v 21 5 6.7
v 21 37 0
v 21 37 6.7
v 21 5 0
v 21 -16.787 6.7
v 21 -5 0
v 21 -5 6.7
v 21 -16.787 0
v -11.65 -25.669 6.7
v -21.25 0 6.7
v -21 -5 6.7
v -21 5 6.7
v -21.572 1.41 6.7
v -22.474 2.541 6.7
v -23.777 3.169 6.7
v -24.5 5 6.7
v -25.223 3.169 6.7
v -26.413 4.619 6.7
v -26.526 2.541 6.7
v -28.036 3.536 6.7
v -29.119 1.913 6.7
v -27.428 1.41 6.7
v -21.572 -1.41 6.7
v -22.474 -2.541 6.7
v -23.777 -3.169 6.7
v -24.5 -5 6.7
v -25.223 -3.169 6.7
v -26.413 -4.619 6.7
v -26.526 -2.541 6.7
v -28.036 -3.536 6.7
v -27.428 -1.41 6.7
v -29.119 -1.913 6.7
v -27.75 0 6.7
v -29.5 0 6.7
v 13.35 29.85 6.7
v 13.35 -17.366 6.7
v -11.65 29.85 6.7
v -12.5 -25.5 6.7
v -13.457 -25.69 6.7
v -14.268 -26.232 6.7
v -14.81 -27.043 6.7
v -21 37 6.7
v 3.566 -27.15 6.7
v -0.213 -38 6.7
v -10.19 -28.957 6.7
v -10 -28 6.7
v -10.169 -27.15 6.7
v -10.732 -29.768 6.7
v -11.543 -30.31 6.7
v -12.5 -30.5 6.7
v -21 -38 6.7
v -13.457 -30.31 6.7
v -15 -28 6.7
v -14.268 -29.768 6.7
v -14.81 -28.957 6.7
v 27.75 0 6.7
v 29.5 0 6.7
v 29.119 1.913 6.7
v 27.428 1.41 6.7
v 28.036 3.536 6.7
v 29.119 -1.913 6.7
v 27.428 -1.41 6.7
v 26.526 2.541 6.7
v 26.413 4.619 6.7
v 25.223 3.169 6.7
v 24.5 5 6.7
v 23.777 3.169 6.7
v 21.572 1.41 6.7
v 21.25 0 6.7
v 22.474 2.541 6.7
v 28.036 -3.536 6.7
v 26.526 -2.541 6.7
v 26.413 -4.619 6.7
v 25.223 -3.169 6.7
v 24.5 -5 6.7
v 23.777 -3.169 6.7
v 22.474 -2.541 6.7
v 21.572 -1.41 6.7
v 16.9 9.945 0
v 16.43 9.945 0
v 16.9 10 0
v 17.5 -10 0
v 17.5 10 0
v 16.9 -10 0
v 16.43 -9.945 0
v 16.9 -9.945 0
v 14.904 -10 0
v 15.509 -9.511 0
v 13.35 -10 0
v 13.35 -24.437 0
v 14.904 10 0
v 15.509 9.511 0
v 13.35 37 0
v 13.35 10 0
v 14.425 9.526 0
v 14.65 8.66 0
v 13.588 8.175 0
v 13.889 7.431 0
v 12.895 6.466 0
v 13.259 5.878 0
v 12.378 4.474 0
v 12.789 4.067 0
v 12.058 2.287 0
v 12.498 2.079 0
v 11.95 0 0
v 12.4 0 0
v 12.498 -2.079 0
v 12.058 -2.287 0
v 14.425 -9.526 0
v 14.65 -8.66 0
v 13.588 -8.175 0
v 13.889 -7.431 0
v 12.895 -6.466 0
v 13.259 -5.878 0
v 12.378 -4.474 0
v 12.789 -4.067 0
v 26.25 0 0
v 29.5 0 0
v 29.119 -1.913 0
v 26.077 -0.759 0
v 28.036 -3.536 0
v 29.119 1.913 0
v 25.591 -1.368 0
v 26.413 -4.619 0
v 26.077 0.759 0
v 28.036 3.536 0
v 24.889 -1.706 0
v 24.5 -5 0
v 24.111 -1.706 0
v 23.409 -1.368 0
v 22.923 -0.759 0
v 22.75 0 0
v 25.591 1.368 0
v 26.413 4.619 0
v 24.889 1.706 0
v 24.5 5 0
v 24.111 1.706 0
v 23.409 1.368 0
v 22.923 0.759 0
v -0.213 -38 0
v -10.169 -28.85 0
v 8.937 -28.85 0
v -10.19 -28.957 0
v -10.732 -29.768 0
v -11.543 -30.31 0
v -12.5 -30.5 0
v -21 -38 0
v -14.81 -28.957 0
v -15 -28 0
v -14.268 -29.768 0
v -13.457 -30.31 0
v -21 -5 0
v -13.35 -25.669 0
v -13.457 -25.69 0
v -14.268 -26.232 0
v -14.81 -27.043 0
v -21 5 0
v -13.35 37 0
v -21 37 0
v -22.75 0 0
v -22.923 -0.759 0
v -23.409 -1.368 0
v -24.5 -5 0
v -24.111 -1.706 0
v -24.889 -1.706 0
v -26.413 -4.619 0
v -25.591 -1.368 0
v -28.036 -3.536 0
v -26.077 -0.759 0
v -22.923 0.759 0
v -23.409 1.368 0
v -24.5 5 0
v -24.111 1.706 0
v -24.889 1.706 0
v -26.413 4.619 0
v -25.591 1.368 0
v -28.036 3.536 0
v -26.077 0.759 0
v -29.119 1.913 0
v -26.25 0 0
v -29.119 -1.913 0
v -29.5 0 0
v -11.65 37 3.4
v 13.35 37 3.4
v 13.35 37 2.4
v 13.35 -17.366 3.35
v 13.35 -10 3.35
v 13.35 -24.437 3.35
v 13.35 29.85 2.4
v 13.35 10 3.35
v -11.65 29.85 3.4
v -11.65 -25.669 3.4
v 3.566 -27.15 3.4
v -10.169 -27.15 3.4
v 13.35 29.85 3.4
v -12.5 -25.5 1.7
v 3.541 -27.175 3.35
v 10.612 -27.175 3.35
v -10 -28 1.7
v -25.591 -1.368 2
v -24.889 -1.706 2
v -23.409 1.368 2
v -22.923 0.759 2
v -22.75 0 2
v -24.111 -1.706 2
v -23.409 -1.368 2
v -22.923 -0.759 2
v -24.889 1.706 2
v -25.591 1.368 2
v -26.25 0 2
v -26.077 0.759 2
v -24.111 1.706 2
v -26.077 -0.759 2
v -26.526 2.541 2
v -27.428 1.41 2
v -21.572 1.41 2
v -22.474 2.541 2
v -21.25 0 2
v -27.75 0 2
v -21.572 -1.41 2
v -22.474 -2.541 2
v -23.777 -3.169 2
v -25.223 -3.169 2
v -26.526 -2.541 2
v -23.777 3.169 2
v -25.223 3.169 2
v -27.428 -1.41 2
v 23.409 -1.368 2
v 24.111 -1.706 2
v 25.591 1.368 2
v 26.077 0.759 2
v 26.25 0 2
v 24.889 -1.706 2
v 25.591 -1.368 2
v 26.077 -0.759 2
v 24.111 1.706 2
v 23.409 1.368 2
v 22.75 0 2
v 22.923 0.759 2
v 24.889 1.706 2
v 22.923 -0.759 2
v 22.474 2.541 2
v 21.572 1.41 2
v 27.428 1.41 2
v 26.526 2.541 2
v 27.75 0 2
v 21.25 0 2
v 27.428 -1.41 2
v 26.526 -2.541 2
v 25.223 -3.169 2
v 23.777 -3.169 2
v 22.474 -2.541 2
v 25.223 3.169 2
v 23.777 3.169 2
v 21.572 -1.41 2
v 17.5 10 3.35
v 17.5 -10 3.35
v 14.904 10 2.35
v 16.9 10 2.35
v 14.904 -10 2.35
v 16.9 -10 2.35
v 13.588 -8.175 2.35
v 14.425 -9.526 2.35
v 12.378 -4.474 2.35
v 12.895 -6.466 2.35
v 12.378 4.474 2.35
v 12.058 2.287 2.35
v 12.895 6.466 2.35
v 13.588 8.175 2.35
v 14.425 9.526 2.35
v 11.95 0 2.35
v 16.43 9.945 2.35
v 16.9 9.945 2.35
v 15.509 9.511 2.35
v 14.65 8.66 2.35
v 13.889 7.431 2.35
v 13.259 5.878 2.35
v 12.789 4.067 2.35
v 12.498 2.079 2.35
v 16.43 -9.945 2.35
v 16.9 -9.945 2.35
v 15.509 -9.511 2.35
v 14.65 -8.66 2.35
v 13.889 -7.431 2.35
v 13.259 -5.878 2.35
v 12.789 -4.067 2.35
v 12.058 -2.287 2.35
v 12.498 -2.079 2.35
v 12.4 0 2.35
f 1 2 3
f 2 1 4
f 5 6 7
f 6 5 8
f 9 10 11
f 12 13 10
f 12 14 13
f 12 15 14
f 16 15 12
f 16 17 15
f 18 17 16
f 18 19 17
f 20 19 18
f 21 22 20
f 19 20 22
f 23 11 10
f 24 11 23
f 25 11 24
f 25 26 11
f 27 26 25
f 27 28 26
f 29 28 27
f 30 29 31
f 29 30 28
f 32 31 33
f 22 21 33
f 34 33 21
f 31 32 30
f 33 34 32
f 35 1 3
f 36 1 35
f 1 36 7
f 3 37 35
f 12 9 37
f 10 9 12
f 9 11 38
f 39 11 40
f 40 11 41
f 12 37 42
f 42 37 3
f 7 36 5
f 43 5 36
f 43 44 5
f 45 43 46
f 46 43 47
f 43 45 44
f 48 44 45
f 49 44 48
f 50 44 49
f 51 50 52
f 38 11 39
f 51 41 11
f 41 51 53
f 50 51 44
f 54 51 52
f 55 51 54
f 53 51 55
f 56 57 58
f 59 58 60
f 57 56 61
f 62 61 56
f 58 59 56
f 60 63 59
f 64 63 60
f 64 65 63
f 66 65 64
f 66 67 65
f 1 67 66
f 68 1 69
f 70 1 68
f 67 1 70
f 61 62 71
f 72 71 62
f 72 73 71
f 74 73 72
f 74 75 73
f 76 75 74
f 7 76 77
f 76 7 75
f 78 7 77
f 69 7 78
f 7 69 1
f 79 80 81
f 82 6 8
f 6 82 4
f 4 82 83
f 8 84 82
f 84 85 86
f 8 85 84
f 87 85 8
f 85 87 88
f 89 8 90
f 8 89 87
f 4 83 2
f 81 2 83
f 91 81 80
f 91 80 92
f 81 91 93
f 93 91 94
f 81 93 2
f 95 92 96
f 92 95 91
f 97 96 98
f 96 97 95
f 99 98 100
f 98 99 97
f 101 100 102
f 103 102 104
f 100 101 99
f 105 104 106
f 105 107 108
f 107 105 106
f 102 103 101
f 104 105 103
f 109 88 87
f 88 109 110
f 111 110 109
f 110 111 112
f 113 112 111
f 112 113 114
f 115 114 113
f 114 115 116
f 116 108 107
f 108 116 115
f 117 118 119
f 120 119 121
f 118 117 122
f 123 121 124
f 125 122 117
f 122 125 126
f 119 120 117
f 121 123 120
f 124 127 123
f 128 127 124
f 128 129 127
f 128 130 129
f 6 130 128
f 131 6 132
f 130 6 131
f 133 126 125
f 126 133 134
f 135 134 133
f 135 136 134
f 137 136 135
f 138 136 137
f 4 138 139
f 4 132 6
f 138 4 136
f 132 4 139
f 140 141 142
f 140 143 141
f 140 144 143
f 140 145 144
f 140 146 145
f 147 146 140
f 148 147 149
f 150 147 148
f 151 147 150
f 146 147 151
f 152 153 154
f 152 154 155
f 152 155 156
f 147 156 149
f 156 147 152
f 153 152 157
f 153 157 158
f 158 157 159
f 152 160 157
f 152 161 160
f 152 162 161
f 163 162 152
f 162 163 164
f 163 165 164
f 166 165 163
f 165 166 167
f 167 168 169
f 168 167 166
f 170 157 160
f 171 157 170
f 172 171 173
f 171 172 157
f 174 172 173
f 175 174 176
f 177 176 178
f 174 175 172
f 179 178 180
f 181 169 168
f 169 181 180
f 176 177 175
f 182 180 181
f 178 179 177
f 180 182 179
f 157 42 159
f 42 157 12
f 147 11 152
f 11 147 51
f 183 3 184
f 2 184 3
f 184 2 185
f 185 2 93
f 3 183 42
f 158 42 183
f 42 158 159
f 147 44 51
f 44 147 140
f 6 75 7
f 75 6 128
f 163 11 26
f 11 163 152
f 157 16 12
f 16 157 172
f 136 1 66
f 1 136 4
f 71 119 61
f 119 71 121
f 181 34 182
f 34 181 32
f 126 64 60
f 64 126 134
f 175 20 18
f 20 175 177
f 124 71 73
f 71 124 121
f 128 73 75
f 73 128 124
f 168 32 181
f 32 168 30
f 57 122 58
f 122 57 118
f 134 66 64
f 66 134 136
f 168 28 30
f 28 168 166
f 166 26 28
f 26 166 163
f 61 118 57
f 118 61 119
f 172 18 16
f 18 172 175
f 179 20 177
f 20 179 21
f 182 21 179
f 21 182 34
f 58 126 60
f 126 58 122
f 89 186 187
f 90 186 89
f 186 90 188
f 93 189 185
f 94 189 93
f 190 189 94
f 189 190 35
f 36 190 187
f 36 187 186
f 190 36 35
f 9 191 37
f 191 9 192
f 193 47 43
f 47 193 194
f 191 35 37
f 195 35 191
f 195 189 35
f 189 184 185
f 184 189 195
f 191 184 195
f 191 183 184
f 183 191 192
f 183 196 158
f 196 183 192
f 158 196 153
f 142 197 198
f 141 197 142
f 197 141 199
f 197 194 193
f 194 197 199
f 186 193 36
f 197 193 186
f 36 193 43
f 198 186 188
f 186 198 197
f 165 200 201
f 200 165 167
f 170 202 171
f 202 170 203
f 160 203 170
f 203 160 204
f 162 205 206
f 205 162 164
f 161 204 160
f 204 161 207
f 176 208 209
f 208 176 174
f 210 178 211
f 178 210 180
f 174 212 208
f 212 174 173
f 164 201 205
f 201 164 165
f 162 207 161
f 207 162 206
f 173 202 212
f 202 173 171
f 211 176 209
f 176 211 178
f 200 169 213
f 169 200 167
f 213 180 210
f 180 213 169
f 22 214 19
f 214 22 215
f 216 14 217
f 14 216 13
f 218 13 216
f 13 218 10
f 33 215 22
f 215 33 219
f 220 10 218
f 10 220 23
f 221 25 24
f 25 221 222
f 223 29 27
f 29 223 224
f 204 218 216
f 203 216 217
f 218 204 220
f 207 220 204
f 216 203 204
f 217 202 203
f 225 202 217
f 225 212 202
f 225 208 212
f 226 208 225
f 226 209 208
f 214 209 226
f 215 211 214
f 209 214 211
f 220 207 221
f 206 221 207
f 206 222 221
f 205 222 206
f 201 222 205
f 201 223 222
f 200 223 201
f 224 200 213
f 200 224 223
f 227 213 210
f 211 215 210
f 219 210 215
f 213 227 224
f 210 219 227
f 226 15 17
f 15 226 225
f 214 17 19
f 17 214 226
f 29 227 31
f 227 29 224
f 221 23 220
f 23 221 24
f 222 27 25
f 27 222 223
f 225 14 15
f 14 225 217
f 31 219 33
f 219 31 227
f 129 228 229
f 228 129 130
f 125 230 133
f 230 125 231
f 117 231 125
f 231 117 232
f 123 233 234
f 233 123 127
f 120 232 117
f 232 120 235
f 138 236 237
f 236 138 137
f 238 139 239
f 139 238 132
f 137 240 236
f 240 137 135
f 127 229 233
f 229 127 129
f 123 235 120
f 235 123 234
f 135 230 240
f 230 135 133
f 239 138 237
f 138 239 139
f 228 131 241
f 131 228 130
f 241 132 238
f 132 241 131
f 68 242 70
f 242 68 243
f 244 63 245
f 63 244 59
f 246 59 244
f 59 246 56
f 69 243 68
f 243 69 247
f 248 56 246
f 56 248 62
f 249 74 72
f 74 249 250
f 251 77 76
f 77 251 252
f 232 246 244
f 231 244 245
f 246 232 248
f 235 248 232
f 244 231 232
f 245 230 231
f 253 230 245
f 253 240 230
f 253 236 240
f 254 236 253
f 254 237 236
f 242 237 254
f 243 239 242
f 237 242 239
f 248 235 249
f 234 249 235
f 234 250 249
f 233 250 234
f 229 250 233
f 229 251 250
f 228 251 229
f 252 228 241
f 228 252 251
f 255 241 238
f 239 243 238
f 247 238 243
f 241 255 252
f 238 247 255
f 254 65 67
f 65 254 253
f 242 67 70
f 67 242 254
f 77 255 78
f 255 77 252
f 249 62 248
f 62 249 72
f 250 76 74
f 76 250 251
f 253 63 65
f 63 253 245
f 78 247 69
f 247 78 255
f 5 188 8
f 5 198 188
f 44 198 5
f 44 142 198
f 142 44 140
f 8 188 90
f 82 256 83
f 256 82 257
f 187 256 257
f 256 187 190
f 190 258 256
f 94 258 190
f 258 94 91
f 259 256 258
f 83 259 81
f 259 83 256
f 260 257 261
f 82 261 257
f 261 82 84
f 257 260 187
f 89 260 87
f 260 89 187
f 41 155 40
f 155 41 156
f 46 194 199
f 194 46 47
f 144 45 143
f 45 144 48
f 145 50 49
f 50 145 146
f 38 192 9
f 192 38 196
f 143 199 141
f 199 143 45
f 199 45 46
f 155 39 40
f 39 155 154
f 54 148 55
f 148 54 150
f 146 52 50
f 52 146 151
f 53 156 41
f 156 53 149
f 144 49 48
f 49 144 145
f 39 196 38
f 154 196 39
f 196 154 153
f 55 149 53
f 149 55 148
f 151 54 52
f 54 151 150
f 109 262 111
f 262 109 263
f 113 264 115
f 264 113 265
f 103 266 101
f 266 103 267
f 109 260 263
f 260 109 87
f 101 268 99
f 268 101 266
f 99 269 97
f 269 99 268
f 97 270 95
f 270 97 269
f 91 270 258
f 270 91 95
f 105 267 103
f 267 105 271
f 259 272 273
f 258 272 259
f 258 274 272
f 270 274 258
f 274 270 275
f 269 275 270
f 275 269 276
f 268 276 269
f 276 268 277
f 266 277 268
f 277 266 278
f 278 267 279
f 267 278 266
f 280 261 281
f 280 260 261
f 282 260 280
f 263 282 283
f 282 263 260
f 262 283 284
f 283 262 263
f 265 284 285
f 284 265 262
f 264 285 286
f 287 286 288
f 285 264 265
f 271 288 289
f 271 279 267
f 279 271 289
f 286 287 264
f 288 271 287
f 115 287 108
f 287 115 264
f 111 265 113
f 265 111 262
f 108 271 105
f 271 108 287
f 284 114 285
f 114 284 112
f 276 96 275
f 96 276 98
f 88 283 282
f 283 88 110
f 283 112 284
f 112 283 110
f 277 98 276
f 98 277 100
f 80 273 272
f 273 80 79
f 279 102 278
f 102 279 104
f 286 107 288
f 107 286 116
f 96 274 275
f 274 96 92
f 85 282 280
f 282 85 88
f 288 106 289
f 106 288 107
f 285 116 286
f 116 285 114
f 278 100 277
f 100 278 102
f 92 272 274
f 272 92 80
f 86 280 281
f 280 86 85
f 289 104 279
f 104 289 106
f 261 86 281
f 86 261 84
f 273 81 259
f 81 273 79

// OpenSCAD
// file: libs/libdict.scad
// This library add dictionary like features to openscad
// the dictionary is a list of pairs as we cannot define new types.
// Unlike a python dictionary we cannot do a proper hash table for speed
// so everything is build around the OpenSCAD search function
// There are a lot of assert statements to ensure data in the "dictionary"
// is in the format of
// * A list of lists
// * Each internal list has a length of two
// * First element of each internal list is a string (the key)
// * All keys are unique.


// Private function:
// This function returns true if the value is in the list
// value must be a string.
// No error checking, for use by is_in only!
function _is_in_str(value, list) =
    search([value], list) != [[]];

// Private function:
// This function returns true if the value is in the list
// value must be a number.
// No error checking, for use by is_in only!
function _is_in_num(value, list) =
    search(value, list) != [];


// This function returns true if the value is in the list
// value must be a string or a number.
function is_in(value, list) =
    assert(is_num(value) || is_string(value) , "is_in: value must be a number or string")
    assert(is_list(list), "is_in: list must be a list")
    is_num(value) ? _is_in_num(value, list) : _is_in_str(value, list);

/**
 * Sum a list
 * This recursive function sums a list.  It should be called with one
 * argument (the list); the other two arguments simply allow it to be
 * "tail-recursive" which lets OpenSCAD optimise it better.  This is
 * very close to the example given in the OpenSCAD docs.
 */
function _libdict_sum_list(list, starting_element=0, running_total=0) =
    starting_element >= len(list) ?
        running_total :
        _libdict_sum_list(list, starting_element + 1, running_total + list[starting_element]);

/**
 * When checking a list for uniqueness, we can get "errant matches".
 * An errant match is when a non-list matches with the first element in a list.
 * i.e. it would consider [1, [1,0]] to be non-unique. We cannot know which 
 * element is the non-list but we do know that it is errant if exactly one 
 * of them is not a list.
 * If two elements are non-lists, they must be identical in order to have matched.  
 * Similarly, if all elements are lists, they must be identical because ``search`` 
 * will have matched them as whole lists.
 * The argument "list" is the list we are checking for uniqueness, and "match" is 
 * a vector of indices that have been returned by ``search``.
 */
function _check_errant_match(list, match) = let(
    non_list = [for (m = match) is_list(list[m])? 0 : 1],
    number_of_non_lists = _libdict_sum_list(non_list)
) number_of_non_lists == 1 ? 0 : 1;

// Returns true if all emements in list are unique.
function is_unique(list) =
    assert(is_list(list), "is_unique: list must be a list")
    let(
        matches = search(list, list, 0),
        // Assign 1 or 0 depending on is the match length for each element
        // return wether any matches are greater than one (mathcing more than
        // itself)
        // note cannot search for true or false so using 1 and zero
        bool_list = [for (match = matches) if (len(match)==1) 0
            // should put a 1 here to show they matched but in the case of
            // [1, [1]] it will match both, so need to check if they are
            // both lists or both not list
            else _check_errant_match(list, match)]
    ) !is_in(1, bool_list);

// Private function:
// Checks that the input is a list and that every element is a list
// of length 2.
// No error checking, for use by valid_dict only!
function _is_pairs(list) =
    !is_list(list) ? false :
        len(list)==0 ? false :
            !is_in(0, [for (pair = list) is_list(pair) && len(pair)==2 ? 1: 0]);

// Private function:
// Checks all elements in the list are strings
// No error checking, for use by valid_dict only!
// Strings can't be empty
function _is_list_of_strings(list) =
    !is_in(0, [for (item = list) is_string(item) && len(item)>0 ? 1: 0]);

// Private function:
// Returns the keus in a dictionary
// No error checking, for use by valid_dict only!
function _keylist(dict)  = [for (pair=dict) pair[0]];

function valid_dict(dict) =
    //if the input are not pairs return instantly
    !_is_pairs(dict) ? false : let (
        //if they are pairs get all keys
        keys = _keylist(dict),
        all_strings =  _is_list_of_strings(keys),
        unique = is_unique(keys)
    ) (all_strings && unique) ? true : false;

// Key lookup for key value pair "dictionary".
// Unlike the built in lookup this works with strings.
function key_lookup(key, dict) =
    assert(is_string(key), "`key` must be a string")
    assert(valid_dict(dict), "`dict` must be a valid 'dictionary'")
    let(
        // key is in [] because otherwise openscad will search for each letter rather than the string.
        index = search([key], dict, 1, 0)[0]
    )  assert (index!=[], "Key lookup failed, key not found!") dict[index][1];

// Creates a new dictionary with a key value pair replaced. Pair must already
// be in dictionary.
function replace_value(key, value, dict) =
    assert(is_string(key), "`key` must be a string")
    assert(valid_dict(dict), "`dict` must be a valid 'dictionary'")
    assert(is_in(key, _keylist(dict)), "`key` not found in dictionary!")
    [for (kv_pair = dict) key!=kv_pair[0] ? kv_pair : [key, value]];


// Creates a new dictionary with a a set of key value pair replaced
// both inputs must be a dictionary. All keys in input must already be
// in dictionary
function replace_multiple_values(rep_dict, dict) =
    assert(valid_dict(rep_dict), "`rep dict` must be a valid 'dictionary'")
    assert(valid_dict(dict), "`dict` must be a valid 'dictionary'")
    let(
        // loop over all keys in replacement dict checking they are in the original
        rep_keys = [for (key = _keylist(rep_dict))
            assert(is_in(key, _keylist(dict)), "`key` not found in dictionary!")
            key
        ]
    ) //Finally return the updated dictionary using this long list comprehension.
    [
        for (kv_pair = dict) let(
            key = kv_pair[0],
            // check if this key is in the replacement dictionary and if so return index
            // key is in [] because otherwise openscad will search for each letter rather
            // than the string.
            index = search([key], rep_dict, 1, 0)[0]
            // if index is empty return original key value pair, else return the key with
            // the replaced value
        ) index == [] ? kv_pair : [key, rep_dict[index][1]]
    ];
// main file
// A holder for a DHC-N01 C-chip to align with the grid.

use <./libs/microscope_parameters.scad>
use <./libs/utilities.scad>
use <./libs/libdict.scad>

C_CHIP_DIMS = [25, 75, 1.7];
C_CHIP_CHAMBER_POS = [-12.5, -28, 0];


c_chip_holder(default_params(), C_CHIP_DIMS, C_CHIP_CHAMBER_POS);

function chip_protrusion() = 10;

module c_chip_holder(params, c_chip_dims, c_chip_chamber_pos){

    block_dims = c_chip_dims + [17, 0, 5];
    block_pos = [-block_dims.x/2, c_chip_chamber_pos.y-chip_protrusion(), 0];
    
    internal_corner_position = c_chip_chamber_pos;
    clamp_corner_position = c_chip_chamber_pos+[c_chip_dims.x, c_chip_dims.y, 0];

    leg_r = key_lookup("leg_r", params);
    hole_dist = leg_r-stage_hole_inset();

    hole_positions = [[-hole_dist, 0, 0], [hole_dist, 0, 0]];

    difference(){
        union(){
            translate(block_pos){
                cube(block_dims);
            }
            hull(){
                for (hole_pos = hole_positions){
                    translate(hole_pos){
                        cylinder(d=10, h=block_dims.z);
                    }
                }
            }
        }

        translate(block_pos+[block_dims.x, 0, 0]){
            rotate(45){
                cube([30, 30, 3*block_dims.z], center=true);
            }
        }

        difference(){
            slide_cutout(c_chip_dims, c_chip_chamber_pos, block_dims.z);
            translate(block_pos+[block_dims.x, 0, block_dims.z]){
                rotate(45){
                    cube([40, 40, block_dims.z], center=true);
                }
            }
        }
        translate_x(c_chip_dims.x/2){
            cube([10, 20, block_dims.z], center=true);
        }
        
        translate(internal_corner_position){
            cylinder(d=5, h=3*block_dims.z, center=true, $fn=16);
        }

        for (hole_pos = hole_positions){
            translate(hole_pos + [0, 0, 2]){
                m3_cap_counterbore(10, 10);
            }
        }
    }
    translate_x(c_chip_dims.x/2+4.4){
        scale([.45, 1])
        difference(){
            cylinder(r=11, h=block_dims.z/2-1);
            cylinder(r=10, h=block_dims.z, center=true);
            translate_x(15){
                cube([30, 30, 30],center=true);
            }
        }
    }
}

module slide_cutout(c_chip_dims, c_chip_chamber_pos, h){
    slope_ratio = 2;
    xy_offset = c_chip_dims.z/slope_ratio;
    // create a clear hole with a bridge for support. Offset over 2 sides of the chip
    translate(c_chip_chamber_pos+[xy_offset, xy_offset, -1]){
        cube([c_chip_dims.x, c_chip_dims.y, c_chip_dims.z*2]);
        cube([c_chip_dims.x, c_chip_dims.y-chip_protrusion()-8, h+2]);
    }
    //Add angled so cutout only touches top of the slide
    hull(){
        translate(c_chip_chamber_pos){
            translate([-xy_offset, -xy_offset, -tiny()]){
                cube([c_chip_dims.x, c_chip_dims.y, tiny()]);
            }
            translate([xy_offset, xy_offset, 2*c_chip_dims.z-tiny()]){
                cube([c_chip_dims.x, c_chip_dims.y, tiny()]);
            }
            translate([xy_offset, -xy_offset, -tiny()]){
                cube([c_chip_dims.x, c_chip_dims.y+2*xy_offset, tiny()]);
            }
        }
    }
}
